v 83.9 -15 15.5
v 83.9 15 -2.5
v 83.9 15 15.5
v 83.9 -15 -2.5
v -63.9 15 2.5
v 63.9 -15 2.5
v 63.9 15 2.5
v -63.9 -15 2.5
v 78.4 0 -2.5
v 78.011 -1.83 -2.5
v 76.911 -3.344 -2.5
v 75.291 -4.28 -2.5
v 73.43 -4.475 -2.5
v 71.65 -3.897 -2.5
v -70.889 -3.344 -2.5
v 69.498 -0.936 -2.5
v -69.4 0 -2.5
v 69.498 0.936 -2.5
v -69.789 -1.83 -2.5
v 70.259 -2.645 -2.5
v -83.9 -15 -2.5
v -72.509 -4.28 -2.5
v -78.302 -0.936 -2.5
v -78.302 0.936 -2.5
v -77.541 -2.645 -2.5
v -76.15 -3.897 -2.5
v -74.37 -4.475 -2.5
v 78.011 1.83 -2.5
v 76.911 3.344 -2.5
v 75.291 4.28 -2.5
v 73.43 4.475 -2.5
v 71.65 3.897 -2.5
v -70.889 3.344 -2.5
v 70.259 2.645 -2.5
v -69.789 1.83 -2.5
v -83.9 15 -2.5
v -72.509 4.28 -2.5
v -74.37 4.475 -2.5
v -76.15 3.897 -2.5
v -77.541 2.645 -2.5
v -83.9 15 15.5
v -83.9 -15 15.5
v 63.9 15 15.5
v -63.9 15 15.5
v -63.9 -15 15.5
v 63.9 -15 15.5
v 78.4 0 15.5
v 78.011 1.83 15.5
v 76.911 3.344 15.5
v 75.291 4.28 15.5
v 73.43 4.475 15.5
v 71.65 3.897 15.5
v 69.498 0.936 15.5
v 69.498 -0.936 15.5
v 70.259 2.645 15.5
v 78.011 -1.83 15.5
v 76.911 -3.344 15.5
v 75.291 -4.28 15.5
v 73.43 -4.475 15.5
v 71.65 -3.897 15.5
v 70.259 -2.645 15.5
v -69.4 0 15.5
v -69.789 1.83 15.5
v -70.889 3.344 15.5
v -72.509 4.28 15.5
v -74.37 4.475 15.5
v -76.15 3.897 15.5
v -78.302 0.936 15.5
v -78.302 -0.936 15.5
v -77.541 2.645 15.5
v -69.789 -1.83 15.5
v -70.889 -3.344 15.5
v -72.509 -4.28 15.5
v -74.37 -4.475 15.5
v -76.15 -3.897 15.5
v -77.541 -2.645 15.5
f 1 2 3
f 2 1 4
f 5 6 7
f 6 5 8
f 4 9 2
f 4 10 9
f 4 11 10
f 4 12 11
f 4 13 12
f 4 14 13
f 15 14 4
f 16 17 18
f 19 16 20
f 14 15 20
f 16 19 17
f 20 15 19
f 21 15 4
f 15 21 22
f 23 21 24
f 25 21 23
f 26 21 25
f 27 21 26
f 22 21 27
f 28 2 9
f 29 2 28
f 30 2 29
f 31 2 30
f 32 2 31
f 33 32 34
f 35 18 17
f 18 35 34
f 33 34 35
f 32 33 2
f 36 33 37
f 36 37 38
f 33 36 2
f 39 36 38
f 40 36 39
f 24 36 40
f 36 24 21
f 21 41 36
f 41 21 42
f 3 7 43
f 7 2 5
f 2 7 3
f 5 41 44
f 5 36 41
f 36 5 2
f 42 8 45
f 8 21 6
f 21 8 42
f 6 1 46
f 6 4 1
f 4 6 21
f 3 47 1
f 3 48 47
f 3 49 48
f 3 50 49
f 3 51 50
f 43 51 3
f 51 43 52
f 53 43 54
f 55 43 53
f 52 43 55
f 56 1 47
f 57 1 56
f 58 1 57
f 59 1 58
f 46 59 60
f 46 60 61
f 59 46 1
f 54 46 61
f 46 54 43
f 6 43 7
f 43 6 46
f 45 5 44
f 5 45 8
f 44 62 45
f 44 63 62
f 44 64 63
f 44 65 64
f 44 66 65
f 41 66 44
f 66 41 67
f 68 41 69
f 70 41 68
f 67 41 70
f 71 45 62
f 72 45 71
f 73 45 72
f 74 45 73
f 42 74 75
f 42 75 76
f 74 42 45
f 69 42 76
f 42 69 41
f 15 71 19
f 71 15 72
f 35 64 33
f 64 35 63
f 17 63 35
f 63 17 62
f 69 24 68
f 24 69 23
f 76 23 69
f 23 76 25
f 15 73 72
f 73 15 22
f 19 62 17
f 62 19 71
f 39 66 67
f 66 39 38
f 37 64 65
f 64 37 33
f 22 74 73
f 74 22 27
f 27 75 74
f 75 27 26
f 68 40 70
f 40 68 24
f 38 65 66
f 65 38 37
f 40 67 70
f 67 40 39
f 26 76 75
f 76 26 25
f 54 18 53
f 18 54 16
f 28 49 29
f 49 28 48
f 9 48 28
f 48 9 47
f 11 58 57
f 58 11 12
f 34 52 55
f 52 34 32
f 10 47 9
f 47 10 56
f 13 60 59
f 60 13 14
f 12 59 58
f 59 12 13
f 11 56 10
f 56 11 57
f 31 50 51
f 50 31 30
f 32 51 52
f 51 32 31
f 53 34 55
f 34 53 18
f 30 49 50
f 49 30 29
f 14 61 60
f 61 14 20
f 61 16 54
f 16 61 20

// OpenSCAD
//----------------------------------------------------------
//-- Tutorial OpenScad
//-- Juan Gonzalez-Gomez (Obijuan) juan@iearobotics.com
//----------------------------------------------------------
//-- (c) Mayo, 2012
//-- Licencia GPL
//----------------------------------------------------------
//-- Ejemplo de modificadores para usarlo en la depuracion
//----------------------------------------------------------

difference() {

  //-- Pieza sin taladros
  union() {
    //-- Cuerpo
    color("blue")
    cube([167.8, 30, 5],center=true);

    //-- Torre derecha
    color("green")
    translate([167.8/2-20/2,0,13/2+5/2])
       cube([20,30,13],center=true);

    //-- Torre izquierda
    color("green")
    translate([-167.8/2+20/2,0,13/2+5/2])
      cube([20,30,13],center=true);
  }

  //-- Taladros
  #translate([-167.8/2+10,0,0])
    cylinder(r=9/2, h=50, center=true);

  #translate([+167.8/2-10,0,0])
    cylinder(r=9/2, h=50, center=true);
}
